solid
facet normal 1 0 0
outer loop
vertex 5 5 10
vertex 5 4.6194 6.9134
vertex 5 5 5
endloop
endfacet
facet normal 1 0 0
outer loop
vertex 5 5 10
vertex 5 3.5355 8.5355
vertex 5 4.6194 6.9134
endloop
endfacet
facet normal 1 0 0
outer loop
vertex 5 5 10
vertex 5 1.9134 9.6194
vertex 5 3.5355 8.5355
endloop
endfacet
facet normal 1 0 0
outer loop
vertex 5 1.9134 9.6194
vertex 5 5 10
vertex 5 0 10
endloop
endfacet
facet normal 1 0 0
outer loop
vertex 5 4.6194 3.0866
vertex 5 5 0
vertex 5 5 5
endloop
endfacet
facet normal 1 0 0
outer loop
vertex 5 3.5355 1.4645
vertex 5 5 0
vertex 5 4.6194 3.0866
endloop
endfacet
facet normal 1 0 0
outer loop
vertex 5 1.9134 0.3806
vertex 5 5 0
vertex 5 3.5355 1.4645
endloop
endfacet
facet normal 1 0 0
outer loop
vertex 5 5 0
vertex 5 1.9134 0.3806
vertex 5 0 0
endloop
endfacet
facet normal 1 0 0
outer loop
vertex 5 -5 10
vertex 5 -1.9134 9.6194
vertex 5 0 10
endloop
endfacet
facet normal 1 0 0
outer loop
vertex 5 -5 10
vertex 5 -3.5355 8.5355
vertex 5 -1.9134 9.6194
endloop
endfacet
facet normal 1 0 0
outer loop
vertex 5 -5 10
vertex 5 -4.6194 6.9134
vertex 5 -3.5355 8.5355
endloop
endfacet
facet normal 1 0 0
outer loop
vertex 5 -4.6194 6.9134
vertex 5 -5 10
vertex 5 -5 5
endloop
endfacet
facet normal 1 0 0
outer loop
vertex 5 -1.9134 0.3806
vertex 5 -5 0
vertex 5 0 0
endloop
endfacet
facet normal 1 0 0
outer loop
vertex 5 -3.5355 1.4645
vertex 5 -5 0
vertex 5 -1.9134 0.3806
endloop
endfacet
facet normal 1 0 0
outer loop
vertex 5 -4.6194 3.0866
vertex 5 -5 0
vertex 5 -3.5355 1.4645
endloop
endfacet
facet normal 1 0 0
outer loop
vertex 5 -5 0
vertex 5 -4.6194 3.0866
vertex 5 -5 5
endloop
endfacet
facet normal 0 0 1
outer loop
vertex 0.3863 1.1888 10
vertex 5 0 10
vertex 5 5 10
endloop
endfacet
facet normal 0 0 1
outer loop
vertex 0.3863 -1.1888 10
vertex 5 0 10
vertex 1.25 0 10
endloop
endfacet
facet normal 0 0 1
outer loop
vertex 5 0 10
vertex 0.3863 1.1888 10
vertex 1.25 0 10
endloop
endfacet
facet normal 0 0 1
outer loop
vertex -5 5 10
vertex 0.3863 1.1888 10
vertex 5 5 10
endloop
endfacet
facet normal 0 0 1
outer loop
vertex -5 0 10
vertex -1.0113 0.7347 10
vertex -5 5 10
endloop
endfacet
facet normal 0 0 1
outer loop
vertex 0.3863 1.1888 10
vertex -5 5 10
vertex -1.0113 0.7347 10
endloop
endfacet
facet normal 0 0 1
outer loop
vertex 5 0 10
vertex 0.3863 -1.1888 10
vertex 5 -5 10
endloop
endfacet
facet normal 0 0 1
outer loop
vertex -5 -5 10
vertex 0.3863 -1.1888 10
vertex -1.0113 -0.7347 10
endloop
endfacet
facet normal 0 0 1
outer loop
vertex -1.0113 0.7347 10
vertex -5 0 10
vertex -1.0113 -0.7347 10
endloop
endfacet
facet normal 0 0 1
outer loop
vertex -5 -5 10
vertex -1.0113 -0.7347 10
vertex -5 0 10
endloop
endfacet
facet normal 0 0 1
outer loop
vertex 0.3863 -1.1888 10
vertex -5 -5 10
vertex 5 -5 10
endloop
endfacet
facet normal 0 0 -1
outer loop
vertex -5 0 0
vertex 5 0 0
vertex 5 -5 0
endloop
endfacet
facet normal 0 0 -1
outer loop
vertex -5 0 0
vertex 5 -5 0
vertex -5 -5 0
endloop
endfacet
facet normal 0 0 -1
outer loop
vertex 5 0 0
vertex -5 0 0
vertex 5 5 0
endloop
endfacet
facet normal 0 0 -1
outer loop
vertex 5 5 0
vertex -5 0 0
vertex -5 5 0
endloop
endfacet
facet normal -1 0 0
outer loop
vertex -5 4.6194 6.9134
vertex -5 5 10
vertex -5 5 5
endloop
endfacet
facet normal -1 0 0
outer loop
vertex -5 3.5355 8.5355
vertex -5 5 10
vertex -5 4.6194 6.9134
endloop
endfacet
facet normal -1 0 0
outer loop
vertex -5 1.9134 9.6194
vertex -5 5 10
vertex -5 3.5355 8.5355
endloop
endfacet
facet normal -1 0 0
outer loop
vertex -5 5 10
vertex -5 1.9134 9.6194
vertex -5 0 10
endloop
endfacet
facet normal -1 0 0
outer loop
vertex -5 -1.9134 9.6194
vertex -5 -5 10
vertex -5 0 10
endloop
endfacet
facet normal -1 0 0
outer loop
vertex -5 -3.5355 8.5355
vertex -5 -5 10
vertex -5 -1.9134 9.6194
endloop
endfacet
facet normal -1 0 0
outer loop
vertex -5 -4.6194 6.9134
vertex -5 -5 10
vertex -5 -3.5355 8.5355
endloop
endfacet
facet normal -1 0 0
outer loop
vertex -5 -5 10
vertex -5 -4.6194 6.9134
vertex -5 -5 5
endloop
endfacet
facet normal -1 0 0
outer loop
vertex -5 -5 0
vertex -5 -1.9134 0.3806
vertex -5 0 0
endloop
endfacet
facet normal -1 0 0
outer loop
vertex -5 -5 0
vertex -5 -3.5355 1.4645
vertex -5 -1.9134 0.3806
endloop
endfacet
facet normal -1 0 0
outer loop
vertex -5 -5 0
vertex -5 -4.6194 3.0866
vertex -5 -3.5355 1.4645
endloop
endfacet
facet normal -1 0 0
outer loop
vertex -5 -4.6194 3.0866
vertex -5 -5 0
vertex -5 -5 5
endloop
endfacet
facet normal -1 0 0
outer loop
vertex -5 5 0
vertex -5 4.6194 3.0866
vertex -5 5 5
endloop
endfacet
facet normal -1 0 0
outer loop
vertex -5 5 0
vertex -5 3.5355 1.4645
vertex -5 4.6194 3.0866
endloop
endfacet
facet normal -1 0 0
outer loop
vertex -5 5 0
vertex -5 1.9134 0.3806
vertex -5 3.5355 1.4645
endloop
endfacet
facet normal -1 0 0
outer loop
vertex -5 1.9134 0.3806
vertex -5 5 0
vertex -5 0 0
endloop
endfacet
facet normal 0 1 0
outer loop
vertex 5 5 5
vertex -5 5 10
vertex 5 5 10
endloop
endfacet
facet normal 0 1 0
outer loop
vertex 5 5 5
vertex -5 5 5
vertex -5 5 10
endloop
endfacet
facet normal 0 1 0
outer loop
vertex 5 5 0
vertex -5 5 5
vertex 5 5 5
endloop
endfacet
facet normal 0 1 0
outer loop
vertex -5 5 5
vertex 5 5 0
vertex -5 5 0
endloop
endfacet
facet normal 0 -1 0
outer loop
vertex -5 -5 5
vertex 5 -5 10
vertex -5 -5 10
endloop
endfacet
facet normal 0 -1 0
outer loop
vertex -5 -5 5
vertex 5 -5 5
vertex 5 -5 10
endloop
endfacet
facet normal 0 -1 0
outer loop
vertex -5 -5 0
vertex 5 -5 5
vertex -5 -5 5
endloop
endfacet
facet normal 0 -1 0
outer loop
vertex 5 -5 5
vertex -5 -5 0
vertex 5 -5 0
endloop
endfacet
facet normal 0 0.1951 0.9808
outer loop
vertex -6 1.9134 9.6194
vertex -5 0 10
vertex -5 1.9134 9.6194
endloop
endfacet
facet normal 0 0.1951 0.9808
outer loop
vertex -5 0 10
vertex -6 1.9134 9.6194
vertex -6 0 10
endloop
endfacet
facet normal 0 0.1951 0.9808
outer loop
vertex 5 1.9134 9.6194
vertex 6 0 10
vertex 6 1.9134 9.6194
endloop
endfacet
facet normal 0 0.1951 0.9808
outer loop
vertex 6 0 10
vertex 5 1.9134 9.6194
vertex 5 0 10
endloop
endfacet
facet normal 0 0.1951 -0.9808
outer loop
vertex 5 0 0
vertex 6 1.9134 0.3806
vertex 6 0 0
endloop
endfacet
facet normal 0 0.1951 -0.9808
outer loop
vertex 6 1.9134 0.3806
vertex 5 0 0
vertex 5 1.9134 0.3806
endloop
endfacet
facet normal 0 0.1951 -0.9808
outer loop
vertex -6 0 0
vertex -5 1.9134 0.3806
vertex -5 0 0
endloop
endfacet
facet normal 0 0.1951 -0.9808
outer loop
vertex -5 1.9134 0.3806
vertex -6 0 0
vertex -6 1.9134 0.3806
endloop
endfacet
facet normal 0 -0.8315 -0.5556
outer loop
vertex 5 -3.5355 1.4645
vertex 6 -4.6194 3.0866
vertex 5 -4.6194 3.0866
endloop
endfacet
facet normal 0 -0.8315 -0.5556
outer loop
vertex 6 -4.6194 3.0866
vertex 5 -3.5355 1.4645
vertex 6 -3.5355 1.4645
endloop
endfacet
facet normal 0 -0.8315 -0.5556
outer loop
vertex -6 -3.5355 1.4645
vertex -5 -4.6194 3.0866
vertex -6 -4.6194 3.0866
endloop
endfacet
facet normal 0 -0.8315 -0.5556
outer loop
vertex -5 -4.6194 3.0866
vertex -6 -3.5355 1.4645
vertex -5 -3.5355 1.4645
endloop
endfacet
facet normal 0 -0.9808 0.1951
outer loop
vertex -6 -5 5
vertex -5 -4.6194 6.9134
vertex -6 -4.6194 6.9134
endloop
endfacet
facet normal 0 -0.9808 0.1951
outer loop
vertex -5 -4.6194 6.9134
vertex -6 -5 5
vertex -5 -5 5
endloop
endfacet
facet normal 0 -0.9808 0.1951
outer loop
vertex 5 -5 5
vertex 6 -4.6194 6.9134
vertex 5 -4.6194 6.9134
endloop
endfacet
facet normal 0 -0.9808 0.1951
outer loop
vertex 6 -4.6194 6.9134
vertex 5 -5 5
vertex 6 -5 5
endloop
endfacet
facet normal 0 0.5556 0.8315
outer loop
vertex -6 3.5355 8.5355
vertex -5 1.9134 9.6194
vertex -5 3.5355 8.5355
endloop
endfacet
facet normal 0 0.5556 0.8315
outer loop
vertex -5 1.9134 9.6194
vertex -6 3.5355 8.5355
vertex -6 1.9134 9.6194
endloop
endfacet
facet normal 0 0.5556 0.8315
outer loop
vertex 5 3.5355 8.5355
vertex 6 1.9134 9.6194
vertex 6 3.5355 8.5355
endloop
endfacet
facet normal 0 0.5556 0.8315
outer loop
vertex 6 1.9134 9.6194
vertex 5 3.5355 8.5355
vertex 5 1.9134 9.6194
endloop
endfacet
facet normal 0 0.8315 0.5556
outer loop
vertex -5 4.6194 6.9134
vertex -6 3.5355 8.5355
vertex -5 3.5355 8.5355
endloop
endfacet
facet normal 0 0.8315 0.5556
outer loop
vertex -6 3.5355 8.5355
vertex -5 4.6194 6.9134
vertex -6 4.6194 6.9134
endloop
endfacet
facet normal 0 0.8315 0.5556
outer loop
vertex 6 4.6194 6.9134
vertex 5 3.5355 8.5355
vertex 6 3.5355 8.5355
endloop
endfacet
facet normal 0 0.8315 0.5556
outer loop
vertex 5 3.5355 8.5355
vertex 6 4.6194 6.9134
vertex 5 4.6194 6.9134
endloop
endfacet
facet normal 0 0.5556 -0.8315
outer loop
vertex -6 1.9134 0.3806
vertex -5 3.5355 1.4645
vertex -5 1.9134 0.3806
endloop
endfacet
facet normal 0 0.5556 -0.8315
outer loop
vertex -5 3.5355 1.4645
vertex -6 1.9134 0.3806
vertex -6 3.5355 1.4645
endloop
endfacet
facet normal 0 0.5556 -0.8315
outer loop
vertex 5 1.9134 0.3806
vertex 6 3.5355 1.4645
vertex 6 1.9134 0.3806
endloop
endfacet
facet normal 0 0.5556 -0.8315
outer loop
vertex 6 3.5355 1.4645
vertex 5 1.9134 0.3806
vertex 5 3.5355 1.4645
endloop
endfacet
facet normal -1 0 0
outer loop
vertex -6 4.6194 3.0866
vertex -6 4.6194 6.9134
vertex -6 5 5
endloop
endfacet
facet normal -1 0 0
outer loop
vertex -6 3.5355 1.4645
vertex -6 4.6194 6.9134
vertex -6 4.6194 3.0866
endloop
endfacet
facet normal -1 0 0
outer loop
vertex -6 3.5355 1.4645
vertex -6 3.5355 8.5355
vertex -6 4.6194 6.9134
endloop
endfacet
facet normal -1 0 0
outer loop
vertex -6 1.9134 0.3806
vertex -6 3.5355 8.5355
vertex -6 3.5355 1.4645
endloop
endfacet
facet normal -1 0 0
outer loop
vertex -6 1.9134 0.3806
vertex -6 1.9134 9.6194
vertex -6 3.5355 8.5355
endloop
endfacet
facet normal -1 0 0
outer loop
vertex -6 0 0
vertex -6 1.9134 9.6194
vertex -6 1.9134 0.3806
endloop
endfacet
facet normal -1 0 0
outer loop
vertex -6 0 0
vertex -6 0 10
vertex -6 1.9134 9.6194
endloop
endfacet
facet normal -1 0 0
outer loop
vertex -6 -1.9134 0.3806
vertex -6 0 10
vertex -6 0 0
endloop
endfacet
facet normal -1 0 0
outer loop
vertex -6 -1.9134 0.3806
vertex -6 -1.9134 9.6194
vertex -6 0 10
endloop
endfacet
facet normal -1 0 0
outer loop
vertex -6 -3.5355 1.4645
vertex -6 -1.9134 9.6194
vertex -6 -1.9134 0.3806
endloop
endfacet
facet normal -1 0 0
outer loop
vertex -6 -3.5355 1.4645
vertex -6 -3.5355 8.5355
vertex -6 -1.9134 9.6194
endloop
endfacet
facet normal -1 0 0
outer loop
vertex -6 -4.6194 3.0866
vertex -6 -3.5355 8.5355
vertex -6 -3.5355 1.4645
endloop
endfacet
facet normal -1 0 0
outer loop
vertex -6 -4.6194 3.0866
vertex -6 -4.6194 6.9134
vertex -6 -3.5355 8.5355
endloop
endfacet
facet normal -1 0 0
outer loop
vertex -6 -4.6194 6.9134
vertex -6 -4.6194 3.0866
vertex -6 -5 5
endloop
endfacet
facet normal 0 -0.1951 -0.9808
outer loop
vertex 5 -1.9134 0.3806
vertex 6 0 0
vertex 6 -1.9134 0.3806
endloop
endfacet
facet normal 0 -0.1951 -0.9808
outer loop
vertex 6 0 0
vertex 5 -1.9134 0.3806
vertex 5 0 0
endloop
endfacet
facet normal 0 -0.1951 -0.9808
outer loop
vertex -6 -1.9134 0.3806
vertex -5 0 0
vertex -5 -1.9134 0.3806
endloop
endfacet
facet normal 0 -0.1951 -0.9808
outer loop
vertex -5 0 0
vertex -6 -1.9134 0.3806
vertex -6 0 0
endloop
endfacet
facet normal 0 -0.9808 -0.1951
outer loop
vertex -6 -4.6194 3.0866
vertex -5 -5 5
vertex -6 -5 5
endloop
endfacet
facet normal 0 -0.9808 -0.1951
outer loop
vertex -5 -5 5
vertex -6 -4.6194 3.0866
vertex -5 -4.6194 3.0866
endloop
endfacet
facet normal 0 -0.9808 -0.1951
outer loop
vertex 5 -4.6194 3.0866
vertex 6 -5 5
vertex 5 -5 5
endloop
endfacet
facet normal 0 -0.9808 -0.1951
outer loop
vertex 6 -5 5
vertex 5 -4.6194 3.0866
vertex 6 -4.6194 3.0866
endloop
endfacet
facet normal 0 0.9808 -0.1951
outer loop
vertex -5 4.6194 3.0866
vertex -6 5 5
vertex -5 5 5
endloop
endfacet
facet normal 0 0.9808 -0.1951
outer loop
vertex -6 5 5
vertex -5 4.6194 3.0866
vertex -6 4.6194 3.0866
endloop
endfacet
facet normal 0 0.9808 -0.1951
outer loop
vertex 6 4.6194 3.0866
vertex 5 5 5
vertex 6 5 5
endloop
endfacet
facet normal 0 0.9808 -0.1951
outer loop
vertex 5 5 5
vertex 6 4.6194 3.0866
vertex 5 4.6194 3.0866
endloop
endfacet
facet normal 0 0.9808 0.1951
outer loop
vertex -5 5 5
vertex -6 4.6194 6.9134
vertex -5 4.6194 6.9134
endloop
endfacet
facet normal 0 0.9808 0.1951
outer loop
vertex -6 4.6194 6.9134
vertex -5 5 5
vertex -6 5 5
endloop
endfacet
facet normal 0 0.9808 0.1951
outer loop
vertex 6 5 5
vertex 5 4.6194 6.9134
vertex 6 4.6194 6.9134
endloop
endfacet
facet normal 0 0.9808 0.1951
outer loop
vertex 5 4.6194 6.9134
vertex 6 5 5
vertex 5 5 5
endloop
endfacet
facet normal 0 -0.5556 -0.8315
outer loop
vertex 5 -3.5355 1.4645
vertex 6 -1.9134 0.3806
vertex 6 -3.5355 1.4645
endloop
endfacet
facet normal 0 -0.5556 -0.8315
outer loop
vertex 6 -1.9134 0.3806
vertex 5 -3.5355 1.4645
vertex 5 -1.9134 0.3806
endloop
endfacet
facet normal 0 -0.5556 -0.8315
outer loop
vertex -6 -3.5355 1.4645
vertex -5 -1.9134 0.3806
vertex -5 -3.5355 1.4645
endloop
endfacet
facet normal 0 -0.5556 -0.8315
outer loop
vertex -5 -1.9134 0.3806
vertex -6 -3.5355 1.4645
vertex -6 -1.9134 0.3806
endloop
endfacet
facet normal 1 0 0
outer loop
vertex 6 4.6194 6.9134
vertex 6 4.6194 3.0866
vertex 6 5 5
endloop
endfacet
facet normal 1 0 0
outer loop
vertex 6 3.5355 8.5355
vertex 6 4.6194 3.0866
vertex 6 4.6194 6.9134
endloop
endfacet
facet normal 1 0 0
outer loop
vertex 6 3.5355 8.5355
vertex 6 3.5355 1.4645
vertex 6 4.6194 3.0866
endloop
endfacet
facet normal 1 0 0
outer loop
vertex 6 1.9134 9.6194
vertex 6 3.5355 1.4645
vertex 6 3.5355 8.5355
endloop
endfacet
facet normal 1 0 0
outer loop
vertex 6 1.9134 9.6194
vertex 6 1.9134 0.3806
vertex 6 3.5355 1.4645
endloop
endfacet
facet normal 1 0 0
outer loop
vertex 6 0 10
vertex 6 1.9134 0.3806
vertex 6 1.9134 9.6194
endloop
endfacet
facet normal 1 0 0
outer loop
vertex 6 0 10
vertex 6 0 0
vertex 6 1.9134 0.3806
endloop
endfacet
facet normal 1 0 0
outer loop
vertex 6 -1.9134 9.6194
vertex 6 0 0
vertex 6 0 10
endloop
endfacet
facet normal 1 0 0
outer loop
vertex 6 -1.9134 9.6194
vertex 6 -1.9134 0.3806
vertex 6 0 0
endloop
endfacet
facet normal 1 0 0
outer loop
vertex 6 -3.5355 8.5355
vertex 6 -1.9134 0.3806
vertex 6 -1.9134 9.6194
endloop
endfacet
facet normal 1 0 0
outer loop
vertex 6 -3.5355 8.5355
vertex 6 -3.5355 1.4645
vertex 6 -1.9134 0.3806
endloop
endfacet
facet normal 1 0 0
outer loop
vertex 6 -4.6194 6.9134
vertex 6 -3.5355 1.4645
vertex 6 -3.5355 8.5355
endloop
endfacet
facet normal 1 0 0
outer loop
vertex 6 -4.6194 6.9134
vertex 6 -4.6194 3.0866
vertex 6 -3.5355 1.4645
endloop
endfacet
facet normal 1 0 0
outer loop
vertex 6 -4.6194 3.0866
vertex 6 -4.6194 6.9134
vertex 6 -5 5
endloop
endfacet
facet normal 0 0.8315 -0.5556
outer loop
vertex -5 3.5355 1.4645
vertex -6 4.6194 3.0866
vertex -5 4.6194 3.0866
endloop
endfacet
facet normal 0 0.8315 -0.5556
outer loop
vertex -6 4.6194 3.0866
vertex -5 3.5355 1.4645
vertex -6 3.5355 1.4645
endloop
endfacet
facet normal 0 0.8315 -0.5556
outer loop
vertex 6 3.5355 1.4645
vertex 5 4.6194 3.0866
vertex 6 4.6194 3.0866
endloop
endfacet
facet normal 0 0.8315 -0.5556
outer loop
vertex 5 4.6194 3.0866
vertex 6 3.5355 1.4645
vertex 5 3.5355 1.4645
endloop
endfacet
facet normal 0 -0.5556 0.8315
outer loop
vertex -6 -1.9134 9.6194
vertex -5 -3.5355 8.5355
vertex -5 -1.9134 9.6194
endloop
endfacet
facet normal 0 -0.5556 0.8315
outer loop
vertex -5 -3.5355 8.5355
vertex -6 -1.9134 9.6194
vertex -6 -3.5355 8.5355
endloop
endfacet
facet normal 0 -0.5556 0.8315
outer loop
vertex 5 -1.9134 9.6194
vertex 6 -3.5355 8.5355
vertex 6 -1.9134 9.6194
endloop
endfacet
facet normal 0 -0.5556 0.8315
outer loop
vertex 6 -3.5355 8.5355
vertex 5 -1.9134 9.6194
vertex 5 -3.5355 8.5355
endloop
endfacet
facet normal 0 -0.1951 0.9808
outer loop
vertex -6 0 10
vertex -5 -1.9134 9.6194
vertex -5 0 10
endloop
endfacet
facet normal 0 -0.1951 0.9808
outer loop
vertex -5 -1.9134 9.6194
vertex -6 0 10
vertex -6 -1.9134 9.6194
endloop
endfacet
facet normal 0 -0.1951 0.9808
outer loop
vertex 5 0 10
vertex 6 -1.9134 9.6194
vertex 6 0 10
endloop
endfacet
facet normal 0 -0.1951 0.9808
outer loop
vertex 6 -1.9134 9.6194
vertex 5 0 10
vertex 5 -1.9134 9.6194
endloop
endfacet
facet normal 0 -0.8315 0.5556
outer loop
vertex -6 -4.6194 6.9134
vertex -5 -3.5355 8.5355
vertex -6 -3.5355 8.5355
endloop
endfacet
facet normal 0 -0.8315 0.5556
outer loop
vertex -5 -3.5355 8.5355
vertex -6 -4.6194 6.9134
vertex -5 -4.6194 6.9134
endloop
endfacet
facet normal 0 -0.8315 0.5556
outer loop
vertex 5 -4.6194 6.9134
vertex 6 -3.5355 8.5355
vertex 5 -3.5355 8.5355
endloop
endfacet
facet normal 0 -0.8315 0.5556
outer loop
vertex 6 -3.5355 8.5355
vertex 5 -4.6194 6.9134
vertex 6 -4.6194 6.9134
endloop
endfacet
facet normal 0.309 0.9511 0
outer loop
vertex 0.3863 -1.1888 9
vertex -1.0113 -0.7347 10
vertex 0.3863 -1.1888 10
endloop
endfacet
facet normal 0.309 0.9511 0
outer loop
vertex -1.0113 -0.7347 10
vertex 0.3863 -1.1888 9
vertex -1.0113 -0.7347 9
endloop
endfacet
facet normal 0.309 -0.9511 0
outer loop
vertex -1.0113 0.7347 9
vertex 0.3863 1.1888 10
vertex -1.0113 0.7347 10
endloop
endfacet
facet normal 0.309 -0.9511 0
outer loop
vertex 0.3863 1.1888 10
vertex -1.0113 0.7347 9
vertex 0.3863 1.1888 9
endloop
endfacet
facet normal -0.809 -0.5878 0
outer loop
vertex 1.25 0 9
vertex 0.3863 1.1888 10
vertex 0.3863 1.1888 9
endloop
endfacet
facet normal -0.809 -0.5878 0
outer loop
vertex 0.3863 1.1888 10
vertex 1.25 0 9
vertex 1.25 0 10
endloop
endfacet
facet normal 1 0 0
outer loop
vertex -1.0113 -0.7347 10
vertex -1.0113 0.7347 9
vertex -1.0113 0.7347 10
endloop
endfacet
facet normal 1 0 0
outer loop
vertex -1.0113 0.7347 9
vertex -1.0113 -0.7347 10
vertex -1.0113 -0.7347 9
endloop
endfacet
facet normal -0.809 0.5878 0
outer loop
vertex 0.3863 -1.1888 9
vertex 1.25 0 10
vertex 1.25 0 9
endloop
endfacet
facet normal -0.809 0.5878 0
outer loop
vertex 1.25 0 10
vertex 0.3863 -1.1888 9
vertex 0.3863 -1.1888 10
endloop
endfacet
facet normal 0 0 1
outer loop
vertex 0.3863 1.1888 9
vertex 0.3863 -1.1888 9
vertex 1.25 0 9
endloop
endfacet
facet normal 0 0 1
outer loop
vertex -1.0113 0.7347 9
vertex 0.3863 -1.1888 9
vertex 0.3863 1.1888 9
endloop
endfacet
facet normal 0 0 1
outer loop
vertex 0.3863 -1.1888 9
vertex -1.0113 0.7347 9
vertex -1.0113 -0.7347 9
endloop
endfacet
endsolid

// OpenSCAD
cube_size = 10; // [10:Small,20:Medium,30:Large]

hole_diameter = 2.5; 
hole_radius = hole_diameter/2;

// How deep should the center hole be?
hole_depth = 1; // [0,1,5,50]

show_wheels = "yes"; // [yes,no]

// How thick should the side wheels be?
wheel_thickness = 1; // [1:40]

// ignore this variable!
// foo=1;

// don't turn functions into params!
function BEZ03(u) = pow((1-u), 3);

// ignore variable values
bing = 3+4;
baz = 3 / hole_depth;

difference() {
  union() {
    translate([0, 0, cube_size/2]) cube([cube_size,cube_size,cube_size], center=true);
    if (show_wheels == "yes") {
      translate([0, 0, cube_size/2]) rotate([0, 90, 0]) {
        cylinder(r=cube_size/2, h=cube_size+(wheel_thickness*2), center=true);
      }
    }
  }
  translate([0, 0, cube_size-hole_depth]) cylinder(r=hole_radius, h=hole_depth);
}
        
